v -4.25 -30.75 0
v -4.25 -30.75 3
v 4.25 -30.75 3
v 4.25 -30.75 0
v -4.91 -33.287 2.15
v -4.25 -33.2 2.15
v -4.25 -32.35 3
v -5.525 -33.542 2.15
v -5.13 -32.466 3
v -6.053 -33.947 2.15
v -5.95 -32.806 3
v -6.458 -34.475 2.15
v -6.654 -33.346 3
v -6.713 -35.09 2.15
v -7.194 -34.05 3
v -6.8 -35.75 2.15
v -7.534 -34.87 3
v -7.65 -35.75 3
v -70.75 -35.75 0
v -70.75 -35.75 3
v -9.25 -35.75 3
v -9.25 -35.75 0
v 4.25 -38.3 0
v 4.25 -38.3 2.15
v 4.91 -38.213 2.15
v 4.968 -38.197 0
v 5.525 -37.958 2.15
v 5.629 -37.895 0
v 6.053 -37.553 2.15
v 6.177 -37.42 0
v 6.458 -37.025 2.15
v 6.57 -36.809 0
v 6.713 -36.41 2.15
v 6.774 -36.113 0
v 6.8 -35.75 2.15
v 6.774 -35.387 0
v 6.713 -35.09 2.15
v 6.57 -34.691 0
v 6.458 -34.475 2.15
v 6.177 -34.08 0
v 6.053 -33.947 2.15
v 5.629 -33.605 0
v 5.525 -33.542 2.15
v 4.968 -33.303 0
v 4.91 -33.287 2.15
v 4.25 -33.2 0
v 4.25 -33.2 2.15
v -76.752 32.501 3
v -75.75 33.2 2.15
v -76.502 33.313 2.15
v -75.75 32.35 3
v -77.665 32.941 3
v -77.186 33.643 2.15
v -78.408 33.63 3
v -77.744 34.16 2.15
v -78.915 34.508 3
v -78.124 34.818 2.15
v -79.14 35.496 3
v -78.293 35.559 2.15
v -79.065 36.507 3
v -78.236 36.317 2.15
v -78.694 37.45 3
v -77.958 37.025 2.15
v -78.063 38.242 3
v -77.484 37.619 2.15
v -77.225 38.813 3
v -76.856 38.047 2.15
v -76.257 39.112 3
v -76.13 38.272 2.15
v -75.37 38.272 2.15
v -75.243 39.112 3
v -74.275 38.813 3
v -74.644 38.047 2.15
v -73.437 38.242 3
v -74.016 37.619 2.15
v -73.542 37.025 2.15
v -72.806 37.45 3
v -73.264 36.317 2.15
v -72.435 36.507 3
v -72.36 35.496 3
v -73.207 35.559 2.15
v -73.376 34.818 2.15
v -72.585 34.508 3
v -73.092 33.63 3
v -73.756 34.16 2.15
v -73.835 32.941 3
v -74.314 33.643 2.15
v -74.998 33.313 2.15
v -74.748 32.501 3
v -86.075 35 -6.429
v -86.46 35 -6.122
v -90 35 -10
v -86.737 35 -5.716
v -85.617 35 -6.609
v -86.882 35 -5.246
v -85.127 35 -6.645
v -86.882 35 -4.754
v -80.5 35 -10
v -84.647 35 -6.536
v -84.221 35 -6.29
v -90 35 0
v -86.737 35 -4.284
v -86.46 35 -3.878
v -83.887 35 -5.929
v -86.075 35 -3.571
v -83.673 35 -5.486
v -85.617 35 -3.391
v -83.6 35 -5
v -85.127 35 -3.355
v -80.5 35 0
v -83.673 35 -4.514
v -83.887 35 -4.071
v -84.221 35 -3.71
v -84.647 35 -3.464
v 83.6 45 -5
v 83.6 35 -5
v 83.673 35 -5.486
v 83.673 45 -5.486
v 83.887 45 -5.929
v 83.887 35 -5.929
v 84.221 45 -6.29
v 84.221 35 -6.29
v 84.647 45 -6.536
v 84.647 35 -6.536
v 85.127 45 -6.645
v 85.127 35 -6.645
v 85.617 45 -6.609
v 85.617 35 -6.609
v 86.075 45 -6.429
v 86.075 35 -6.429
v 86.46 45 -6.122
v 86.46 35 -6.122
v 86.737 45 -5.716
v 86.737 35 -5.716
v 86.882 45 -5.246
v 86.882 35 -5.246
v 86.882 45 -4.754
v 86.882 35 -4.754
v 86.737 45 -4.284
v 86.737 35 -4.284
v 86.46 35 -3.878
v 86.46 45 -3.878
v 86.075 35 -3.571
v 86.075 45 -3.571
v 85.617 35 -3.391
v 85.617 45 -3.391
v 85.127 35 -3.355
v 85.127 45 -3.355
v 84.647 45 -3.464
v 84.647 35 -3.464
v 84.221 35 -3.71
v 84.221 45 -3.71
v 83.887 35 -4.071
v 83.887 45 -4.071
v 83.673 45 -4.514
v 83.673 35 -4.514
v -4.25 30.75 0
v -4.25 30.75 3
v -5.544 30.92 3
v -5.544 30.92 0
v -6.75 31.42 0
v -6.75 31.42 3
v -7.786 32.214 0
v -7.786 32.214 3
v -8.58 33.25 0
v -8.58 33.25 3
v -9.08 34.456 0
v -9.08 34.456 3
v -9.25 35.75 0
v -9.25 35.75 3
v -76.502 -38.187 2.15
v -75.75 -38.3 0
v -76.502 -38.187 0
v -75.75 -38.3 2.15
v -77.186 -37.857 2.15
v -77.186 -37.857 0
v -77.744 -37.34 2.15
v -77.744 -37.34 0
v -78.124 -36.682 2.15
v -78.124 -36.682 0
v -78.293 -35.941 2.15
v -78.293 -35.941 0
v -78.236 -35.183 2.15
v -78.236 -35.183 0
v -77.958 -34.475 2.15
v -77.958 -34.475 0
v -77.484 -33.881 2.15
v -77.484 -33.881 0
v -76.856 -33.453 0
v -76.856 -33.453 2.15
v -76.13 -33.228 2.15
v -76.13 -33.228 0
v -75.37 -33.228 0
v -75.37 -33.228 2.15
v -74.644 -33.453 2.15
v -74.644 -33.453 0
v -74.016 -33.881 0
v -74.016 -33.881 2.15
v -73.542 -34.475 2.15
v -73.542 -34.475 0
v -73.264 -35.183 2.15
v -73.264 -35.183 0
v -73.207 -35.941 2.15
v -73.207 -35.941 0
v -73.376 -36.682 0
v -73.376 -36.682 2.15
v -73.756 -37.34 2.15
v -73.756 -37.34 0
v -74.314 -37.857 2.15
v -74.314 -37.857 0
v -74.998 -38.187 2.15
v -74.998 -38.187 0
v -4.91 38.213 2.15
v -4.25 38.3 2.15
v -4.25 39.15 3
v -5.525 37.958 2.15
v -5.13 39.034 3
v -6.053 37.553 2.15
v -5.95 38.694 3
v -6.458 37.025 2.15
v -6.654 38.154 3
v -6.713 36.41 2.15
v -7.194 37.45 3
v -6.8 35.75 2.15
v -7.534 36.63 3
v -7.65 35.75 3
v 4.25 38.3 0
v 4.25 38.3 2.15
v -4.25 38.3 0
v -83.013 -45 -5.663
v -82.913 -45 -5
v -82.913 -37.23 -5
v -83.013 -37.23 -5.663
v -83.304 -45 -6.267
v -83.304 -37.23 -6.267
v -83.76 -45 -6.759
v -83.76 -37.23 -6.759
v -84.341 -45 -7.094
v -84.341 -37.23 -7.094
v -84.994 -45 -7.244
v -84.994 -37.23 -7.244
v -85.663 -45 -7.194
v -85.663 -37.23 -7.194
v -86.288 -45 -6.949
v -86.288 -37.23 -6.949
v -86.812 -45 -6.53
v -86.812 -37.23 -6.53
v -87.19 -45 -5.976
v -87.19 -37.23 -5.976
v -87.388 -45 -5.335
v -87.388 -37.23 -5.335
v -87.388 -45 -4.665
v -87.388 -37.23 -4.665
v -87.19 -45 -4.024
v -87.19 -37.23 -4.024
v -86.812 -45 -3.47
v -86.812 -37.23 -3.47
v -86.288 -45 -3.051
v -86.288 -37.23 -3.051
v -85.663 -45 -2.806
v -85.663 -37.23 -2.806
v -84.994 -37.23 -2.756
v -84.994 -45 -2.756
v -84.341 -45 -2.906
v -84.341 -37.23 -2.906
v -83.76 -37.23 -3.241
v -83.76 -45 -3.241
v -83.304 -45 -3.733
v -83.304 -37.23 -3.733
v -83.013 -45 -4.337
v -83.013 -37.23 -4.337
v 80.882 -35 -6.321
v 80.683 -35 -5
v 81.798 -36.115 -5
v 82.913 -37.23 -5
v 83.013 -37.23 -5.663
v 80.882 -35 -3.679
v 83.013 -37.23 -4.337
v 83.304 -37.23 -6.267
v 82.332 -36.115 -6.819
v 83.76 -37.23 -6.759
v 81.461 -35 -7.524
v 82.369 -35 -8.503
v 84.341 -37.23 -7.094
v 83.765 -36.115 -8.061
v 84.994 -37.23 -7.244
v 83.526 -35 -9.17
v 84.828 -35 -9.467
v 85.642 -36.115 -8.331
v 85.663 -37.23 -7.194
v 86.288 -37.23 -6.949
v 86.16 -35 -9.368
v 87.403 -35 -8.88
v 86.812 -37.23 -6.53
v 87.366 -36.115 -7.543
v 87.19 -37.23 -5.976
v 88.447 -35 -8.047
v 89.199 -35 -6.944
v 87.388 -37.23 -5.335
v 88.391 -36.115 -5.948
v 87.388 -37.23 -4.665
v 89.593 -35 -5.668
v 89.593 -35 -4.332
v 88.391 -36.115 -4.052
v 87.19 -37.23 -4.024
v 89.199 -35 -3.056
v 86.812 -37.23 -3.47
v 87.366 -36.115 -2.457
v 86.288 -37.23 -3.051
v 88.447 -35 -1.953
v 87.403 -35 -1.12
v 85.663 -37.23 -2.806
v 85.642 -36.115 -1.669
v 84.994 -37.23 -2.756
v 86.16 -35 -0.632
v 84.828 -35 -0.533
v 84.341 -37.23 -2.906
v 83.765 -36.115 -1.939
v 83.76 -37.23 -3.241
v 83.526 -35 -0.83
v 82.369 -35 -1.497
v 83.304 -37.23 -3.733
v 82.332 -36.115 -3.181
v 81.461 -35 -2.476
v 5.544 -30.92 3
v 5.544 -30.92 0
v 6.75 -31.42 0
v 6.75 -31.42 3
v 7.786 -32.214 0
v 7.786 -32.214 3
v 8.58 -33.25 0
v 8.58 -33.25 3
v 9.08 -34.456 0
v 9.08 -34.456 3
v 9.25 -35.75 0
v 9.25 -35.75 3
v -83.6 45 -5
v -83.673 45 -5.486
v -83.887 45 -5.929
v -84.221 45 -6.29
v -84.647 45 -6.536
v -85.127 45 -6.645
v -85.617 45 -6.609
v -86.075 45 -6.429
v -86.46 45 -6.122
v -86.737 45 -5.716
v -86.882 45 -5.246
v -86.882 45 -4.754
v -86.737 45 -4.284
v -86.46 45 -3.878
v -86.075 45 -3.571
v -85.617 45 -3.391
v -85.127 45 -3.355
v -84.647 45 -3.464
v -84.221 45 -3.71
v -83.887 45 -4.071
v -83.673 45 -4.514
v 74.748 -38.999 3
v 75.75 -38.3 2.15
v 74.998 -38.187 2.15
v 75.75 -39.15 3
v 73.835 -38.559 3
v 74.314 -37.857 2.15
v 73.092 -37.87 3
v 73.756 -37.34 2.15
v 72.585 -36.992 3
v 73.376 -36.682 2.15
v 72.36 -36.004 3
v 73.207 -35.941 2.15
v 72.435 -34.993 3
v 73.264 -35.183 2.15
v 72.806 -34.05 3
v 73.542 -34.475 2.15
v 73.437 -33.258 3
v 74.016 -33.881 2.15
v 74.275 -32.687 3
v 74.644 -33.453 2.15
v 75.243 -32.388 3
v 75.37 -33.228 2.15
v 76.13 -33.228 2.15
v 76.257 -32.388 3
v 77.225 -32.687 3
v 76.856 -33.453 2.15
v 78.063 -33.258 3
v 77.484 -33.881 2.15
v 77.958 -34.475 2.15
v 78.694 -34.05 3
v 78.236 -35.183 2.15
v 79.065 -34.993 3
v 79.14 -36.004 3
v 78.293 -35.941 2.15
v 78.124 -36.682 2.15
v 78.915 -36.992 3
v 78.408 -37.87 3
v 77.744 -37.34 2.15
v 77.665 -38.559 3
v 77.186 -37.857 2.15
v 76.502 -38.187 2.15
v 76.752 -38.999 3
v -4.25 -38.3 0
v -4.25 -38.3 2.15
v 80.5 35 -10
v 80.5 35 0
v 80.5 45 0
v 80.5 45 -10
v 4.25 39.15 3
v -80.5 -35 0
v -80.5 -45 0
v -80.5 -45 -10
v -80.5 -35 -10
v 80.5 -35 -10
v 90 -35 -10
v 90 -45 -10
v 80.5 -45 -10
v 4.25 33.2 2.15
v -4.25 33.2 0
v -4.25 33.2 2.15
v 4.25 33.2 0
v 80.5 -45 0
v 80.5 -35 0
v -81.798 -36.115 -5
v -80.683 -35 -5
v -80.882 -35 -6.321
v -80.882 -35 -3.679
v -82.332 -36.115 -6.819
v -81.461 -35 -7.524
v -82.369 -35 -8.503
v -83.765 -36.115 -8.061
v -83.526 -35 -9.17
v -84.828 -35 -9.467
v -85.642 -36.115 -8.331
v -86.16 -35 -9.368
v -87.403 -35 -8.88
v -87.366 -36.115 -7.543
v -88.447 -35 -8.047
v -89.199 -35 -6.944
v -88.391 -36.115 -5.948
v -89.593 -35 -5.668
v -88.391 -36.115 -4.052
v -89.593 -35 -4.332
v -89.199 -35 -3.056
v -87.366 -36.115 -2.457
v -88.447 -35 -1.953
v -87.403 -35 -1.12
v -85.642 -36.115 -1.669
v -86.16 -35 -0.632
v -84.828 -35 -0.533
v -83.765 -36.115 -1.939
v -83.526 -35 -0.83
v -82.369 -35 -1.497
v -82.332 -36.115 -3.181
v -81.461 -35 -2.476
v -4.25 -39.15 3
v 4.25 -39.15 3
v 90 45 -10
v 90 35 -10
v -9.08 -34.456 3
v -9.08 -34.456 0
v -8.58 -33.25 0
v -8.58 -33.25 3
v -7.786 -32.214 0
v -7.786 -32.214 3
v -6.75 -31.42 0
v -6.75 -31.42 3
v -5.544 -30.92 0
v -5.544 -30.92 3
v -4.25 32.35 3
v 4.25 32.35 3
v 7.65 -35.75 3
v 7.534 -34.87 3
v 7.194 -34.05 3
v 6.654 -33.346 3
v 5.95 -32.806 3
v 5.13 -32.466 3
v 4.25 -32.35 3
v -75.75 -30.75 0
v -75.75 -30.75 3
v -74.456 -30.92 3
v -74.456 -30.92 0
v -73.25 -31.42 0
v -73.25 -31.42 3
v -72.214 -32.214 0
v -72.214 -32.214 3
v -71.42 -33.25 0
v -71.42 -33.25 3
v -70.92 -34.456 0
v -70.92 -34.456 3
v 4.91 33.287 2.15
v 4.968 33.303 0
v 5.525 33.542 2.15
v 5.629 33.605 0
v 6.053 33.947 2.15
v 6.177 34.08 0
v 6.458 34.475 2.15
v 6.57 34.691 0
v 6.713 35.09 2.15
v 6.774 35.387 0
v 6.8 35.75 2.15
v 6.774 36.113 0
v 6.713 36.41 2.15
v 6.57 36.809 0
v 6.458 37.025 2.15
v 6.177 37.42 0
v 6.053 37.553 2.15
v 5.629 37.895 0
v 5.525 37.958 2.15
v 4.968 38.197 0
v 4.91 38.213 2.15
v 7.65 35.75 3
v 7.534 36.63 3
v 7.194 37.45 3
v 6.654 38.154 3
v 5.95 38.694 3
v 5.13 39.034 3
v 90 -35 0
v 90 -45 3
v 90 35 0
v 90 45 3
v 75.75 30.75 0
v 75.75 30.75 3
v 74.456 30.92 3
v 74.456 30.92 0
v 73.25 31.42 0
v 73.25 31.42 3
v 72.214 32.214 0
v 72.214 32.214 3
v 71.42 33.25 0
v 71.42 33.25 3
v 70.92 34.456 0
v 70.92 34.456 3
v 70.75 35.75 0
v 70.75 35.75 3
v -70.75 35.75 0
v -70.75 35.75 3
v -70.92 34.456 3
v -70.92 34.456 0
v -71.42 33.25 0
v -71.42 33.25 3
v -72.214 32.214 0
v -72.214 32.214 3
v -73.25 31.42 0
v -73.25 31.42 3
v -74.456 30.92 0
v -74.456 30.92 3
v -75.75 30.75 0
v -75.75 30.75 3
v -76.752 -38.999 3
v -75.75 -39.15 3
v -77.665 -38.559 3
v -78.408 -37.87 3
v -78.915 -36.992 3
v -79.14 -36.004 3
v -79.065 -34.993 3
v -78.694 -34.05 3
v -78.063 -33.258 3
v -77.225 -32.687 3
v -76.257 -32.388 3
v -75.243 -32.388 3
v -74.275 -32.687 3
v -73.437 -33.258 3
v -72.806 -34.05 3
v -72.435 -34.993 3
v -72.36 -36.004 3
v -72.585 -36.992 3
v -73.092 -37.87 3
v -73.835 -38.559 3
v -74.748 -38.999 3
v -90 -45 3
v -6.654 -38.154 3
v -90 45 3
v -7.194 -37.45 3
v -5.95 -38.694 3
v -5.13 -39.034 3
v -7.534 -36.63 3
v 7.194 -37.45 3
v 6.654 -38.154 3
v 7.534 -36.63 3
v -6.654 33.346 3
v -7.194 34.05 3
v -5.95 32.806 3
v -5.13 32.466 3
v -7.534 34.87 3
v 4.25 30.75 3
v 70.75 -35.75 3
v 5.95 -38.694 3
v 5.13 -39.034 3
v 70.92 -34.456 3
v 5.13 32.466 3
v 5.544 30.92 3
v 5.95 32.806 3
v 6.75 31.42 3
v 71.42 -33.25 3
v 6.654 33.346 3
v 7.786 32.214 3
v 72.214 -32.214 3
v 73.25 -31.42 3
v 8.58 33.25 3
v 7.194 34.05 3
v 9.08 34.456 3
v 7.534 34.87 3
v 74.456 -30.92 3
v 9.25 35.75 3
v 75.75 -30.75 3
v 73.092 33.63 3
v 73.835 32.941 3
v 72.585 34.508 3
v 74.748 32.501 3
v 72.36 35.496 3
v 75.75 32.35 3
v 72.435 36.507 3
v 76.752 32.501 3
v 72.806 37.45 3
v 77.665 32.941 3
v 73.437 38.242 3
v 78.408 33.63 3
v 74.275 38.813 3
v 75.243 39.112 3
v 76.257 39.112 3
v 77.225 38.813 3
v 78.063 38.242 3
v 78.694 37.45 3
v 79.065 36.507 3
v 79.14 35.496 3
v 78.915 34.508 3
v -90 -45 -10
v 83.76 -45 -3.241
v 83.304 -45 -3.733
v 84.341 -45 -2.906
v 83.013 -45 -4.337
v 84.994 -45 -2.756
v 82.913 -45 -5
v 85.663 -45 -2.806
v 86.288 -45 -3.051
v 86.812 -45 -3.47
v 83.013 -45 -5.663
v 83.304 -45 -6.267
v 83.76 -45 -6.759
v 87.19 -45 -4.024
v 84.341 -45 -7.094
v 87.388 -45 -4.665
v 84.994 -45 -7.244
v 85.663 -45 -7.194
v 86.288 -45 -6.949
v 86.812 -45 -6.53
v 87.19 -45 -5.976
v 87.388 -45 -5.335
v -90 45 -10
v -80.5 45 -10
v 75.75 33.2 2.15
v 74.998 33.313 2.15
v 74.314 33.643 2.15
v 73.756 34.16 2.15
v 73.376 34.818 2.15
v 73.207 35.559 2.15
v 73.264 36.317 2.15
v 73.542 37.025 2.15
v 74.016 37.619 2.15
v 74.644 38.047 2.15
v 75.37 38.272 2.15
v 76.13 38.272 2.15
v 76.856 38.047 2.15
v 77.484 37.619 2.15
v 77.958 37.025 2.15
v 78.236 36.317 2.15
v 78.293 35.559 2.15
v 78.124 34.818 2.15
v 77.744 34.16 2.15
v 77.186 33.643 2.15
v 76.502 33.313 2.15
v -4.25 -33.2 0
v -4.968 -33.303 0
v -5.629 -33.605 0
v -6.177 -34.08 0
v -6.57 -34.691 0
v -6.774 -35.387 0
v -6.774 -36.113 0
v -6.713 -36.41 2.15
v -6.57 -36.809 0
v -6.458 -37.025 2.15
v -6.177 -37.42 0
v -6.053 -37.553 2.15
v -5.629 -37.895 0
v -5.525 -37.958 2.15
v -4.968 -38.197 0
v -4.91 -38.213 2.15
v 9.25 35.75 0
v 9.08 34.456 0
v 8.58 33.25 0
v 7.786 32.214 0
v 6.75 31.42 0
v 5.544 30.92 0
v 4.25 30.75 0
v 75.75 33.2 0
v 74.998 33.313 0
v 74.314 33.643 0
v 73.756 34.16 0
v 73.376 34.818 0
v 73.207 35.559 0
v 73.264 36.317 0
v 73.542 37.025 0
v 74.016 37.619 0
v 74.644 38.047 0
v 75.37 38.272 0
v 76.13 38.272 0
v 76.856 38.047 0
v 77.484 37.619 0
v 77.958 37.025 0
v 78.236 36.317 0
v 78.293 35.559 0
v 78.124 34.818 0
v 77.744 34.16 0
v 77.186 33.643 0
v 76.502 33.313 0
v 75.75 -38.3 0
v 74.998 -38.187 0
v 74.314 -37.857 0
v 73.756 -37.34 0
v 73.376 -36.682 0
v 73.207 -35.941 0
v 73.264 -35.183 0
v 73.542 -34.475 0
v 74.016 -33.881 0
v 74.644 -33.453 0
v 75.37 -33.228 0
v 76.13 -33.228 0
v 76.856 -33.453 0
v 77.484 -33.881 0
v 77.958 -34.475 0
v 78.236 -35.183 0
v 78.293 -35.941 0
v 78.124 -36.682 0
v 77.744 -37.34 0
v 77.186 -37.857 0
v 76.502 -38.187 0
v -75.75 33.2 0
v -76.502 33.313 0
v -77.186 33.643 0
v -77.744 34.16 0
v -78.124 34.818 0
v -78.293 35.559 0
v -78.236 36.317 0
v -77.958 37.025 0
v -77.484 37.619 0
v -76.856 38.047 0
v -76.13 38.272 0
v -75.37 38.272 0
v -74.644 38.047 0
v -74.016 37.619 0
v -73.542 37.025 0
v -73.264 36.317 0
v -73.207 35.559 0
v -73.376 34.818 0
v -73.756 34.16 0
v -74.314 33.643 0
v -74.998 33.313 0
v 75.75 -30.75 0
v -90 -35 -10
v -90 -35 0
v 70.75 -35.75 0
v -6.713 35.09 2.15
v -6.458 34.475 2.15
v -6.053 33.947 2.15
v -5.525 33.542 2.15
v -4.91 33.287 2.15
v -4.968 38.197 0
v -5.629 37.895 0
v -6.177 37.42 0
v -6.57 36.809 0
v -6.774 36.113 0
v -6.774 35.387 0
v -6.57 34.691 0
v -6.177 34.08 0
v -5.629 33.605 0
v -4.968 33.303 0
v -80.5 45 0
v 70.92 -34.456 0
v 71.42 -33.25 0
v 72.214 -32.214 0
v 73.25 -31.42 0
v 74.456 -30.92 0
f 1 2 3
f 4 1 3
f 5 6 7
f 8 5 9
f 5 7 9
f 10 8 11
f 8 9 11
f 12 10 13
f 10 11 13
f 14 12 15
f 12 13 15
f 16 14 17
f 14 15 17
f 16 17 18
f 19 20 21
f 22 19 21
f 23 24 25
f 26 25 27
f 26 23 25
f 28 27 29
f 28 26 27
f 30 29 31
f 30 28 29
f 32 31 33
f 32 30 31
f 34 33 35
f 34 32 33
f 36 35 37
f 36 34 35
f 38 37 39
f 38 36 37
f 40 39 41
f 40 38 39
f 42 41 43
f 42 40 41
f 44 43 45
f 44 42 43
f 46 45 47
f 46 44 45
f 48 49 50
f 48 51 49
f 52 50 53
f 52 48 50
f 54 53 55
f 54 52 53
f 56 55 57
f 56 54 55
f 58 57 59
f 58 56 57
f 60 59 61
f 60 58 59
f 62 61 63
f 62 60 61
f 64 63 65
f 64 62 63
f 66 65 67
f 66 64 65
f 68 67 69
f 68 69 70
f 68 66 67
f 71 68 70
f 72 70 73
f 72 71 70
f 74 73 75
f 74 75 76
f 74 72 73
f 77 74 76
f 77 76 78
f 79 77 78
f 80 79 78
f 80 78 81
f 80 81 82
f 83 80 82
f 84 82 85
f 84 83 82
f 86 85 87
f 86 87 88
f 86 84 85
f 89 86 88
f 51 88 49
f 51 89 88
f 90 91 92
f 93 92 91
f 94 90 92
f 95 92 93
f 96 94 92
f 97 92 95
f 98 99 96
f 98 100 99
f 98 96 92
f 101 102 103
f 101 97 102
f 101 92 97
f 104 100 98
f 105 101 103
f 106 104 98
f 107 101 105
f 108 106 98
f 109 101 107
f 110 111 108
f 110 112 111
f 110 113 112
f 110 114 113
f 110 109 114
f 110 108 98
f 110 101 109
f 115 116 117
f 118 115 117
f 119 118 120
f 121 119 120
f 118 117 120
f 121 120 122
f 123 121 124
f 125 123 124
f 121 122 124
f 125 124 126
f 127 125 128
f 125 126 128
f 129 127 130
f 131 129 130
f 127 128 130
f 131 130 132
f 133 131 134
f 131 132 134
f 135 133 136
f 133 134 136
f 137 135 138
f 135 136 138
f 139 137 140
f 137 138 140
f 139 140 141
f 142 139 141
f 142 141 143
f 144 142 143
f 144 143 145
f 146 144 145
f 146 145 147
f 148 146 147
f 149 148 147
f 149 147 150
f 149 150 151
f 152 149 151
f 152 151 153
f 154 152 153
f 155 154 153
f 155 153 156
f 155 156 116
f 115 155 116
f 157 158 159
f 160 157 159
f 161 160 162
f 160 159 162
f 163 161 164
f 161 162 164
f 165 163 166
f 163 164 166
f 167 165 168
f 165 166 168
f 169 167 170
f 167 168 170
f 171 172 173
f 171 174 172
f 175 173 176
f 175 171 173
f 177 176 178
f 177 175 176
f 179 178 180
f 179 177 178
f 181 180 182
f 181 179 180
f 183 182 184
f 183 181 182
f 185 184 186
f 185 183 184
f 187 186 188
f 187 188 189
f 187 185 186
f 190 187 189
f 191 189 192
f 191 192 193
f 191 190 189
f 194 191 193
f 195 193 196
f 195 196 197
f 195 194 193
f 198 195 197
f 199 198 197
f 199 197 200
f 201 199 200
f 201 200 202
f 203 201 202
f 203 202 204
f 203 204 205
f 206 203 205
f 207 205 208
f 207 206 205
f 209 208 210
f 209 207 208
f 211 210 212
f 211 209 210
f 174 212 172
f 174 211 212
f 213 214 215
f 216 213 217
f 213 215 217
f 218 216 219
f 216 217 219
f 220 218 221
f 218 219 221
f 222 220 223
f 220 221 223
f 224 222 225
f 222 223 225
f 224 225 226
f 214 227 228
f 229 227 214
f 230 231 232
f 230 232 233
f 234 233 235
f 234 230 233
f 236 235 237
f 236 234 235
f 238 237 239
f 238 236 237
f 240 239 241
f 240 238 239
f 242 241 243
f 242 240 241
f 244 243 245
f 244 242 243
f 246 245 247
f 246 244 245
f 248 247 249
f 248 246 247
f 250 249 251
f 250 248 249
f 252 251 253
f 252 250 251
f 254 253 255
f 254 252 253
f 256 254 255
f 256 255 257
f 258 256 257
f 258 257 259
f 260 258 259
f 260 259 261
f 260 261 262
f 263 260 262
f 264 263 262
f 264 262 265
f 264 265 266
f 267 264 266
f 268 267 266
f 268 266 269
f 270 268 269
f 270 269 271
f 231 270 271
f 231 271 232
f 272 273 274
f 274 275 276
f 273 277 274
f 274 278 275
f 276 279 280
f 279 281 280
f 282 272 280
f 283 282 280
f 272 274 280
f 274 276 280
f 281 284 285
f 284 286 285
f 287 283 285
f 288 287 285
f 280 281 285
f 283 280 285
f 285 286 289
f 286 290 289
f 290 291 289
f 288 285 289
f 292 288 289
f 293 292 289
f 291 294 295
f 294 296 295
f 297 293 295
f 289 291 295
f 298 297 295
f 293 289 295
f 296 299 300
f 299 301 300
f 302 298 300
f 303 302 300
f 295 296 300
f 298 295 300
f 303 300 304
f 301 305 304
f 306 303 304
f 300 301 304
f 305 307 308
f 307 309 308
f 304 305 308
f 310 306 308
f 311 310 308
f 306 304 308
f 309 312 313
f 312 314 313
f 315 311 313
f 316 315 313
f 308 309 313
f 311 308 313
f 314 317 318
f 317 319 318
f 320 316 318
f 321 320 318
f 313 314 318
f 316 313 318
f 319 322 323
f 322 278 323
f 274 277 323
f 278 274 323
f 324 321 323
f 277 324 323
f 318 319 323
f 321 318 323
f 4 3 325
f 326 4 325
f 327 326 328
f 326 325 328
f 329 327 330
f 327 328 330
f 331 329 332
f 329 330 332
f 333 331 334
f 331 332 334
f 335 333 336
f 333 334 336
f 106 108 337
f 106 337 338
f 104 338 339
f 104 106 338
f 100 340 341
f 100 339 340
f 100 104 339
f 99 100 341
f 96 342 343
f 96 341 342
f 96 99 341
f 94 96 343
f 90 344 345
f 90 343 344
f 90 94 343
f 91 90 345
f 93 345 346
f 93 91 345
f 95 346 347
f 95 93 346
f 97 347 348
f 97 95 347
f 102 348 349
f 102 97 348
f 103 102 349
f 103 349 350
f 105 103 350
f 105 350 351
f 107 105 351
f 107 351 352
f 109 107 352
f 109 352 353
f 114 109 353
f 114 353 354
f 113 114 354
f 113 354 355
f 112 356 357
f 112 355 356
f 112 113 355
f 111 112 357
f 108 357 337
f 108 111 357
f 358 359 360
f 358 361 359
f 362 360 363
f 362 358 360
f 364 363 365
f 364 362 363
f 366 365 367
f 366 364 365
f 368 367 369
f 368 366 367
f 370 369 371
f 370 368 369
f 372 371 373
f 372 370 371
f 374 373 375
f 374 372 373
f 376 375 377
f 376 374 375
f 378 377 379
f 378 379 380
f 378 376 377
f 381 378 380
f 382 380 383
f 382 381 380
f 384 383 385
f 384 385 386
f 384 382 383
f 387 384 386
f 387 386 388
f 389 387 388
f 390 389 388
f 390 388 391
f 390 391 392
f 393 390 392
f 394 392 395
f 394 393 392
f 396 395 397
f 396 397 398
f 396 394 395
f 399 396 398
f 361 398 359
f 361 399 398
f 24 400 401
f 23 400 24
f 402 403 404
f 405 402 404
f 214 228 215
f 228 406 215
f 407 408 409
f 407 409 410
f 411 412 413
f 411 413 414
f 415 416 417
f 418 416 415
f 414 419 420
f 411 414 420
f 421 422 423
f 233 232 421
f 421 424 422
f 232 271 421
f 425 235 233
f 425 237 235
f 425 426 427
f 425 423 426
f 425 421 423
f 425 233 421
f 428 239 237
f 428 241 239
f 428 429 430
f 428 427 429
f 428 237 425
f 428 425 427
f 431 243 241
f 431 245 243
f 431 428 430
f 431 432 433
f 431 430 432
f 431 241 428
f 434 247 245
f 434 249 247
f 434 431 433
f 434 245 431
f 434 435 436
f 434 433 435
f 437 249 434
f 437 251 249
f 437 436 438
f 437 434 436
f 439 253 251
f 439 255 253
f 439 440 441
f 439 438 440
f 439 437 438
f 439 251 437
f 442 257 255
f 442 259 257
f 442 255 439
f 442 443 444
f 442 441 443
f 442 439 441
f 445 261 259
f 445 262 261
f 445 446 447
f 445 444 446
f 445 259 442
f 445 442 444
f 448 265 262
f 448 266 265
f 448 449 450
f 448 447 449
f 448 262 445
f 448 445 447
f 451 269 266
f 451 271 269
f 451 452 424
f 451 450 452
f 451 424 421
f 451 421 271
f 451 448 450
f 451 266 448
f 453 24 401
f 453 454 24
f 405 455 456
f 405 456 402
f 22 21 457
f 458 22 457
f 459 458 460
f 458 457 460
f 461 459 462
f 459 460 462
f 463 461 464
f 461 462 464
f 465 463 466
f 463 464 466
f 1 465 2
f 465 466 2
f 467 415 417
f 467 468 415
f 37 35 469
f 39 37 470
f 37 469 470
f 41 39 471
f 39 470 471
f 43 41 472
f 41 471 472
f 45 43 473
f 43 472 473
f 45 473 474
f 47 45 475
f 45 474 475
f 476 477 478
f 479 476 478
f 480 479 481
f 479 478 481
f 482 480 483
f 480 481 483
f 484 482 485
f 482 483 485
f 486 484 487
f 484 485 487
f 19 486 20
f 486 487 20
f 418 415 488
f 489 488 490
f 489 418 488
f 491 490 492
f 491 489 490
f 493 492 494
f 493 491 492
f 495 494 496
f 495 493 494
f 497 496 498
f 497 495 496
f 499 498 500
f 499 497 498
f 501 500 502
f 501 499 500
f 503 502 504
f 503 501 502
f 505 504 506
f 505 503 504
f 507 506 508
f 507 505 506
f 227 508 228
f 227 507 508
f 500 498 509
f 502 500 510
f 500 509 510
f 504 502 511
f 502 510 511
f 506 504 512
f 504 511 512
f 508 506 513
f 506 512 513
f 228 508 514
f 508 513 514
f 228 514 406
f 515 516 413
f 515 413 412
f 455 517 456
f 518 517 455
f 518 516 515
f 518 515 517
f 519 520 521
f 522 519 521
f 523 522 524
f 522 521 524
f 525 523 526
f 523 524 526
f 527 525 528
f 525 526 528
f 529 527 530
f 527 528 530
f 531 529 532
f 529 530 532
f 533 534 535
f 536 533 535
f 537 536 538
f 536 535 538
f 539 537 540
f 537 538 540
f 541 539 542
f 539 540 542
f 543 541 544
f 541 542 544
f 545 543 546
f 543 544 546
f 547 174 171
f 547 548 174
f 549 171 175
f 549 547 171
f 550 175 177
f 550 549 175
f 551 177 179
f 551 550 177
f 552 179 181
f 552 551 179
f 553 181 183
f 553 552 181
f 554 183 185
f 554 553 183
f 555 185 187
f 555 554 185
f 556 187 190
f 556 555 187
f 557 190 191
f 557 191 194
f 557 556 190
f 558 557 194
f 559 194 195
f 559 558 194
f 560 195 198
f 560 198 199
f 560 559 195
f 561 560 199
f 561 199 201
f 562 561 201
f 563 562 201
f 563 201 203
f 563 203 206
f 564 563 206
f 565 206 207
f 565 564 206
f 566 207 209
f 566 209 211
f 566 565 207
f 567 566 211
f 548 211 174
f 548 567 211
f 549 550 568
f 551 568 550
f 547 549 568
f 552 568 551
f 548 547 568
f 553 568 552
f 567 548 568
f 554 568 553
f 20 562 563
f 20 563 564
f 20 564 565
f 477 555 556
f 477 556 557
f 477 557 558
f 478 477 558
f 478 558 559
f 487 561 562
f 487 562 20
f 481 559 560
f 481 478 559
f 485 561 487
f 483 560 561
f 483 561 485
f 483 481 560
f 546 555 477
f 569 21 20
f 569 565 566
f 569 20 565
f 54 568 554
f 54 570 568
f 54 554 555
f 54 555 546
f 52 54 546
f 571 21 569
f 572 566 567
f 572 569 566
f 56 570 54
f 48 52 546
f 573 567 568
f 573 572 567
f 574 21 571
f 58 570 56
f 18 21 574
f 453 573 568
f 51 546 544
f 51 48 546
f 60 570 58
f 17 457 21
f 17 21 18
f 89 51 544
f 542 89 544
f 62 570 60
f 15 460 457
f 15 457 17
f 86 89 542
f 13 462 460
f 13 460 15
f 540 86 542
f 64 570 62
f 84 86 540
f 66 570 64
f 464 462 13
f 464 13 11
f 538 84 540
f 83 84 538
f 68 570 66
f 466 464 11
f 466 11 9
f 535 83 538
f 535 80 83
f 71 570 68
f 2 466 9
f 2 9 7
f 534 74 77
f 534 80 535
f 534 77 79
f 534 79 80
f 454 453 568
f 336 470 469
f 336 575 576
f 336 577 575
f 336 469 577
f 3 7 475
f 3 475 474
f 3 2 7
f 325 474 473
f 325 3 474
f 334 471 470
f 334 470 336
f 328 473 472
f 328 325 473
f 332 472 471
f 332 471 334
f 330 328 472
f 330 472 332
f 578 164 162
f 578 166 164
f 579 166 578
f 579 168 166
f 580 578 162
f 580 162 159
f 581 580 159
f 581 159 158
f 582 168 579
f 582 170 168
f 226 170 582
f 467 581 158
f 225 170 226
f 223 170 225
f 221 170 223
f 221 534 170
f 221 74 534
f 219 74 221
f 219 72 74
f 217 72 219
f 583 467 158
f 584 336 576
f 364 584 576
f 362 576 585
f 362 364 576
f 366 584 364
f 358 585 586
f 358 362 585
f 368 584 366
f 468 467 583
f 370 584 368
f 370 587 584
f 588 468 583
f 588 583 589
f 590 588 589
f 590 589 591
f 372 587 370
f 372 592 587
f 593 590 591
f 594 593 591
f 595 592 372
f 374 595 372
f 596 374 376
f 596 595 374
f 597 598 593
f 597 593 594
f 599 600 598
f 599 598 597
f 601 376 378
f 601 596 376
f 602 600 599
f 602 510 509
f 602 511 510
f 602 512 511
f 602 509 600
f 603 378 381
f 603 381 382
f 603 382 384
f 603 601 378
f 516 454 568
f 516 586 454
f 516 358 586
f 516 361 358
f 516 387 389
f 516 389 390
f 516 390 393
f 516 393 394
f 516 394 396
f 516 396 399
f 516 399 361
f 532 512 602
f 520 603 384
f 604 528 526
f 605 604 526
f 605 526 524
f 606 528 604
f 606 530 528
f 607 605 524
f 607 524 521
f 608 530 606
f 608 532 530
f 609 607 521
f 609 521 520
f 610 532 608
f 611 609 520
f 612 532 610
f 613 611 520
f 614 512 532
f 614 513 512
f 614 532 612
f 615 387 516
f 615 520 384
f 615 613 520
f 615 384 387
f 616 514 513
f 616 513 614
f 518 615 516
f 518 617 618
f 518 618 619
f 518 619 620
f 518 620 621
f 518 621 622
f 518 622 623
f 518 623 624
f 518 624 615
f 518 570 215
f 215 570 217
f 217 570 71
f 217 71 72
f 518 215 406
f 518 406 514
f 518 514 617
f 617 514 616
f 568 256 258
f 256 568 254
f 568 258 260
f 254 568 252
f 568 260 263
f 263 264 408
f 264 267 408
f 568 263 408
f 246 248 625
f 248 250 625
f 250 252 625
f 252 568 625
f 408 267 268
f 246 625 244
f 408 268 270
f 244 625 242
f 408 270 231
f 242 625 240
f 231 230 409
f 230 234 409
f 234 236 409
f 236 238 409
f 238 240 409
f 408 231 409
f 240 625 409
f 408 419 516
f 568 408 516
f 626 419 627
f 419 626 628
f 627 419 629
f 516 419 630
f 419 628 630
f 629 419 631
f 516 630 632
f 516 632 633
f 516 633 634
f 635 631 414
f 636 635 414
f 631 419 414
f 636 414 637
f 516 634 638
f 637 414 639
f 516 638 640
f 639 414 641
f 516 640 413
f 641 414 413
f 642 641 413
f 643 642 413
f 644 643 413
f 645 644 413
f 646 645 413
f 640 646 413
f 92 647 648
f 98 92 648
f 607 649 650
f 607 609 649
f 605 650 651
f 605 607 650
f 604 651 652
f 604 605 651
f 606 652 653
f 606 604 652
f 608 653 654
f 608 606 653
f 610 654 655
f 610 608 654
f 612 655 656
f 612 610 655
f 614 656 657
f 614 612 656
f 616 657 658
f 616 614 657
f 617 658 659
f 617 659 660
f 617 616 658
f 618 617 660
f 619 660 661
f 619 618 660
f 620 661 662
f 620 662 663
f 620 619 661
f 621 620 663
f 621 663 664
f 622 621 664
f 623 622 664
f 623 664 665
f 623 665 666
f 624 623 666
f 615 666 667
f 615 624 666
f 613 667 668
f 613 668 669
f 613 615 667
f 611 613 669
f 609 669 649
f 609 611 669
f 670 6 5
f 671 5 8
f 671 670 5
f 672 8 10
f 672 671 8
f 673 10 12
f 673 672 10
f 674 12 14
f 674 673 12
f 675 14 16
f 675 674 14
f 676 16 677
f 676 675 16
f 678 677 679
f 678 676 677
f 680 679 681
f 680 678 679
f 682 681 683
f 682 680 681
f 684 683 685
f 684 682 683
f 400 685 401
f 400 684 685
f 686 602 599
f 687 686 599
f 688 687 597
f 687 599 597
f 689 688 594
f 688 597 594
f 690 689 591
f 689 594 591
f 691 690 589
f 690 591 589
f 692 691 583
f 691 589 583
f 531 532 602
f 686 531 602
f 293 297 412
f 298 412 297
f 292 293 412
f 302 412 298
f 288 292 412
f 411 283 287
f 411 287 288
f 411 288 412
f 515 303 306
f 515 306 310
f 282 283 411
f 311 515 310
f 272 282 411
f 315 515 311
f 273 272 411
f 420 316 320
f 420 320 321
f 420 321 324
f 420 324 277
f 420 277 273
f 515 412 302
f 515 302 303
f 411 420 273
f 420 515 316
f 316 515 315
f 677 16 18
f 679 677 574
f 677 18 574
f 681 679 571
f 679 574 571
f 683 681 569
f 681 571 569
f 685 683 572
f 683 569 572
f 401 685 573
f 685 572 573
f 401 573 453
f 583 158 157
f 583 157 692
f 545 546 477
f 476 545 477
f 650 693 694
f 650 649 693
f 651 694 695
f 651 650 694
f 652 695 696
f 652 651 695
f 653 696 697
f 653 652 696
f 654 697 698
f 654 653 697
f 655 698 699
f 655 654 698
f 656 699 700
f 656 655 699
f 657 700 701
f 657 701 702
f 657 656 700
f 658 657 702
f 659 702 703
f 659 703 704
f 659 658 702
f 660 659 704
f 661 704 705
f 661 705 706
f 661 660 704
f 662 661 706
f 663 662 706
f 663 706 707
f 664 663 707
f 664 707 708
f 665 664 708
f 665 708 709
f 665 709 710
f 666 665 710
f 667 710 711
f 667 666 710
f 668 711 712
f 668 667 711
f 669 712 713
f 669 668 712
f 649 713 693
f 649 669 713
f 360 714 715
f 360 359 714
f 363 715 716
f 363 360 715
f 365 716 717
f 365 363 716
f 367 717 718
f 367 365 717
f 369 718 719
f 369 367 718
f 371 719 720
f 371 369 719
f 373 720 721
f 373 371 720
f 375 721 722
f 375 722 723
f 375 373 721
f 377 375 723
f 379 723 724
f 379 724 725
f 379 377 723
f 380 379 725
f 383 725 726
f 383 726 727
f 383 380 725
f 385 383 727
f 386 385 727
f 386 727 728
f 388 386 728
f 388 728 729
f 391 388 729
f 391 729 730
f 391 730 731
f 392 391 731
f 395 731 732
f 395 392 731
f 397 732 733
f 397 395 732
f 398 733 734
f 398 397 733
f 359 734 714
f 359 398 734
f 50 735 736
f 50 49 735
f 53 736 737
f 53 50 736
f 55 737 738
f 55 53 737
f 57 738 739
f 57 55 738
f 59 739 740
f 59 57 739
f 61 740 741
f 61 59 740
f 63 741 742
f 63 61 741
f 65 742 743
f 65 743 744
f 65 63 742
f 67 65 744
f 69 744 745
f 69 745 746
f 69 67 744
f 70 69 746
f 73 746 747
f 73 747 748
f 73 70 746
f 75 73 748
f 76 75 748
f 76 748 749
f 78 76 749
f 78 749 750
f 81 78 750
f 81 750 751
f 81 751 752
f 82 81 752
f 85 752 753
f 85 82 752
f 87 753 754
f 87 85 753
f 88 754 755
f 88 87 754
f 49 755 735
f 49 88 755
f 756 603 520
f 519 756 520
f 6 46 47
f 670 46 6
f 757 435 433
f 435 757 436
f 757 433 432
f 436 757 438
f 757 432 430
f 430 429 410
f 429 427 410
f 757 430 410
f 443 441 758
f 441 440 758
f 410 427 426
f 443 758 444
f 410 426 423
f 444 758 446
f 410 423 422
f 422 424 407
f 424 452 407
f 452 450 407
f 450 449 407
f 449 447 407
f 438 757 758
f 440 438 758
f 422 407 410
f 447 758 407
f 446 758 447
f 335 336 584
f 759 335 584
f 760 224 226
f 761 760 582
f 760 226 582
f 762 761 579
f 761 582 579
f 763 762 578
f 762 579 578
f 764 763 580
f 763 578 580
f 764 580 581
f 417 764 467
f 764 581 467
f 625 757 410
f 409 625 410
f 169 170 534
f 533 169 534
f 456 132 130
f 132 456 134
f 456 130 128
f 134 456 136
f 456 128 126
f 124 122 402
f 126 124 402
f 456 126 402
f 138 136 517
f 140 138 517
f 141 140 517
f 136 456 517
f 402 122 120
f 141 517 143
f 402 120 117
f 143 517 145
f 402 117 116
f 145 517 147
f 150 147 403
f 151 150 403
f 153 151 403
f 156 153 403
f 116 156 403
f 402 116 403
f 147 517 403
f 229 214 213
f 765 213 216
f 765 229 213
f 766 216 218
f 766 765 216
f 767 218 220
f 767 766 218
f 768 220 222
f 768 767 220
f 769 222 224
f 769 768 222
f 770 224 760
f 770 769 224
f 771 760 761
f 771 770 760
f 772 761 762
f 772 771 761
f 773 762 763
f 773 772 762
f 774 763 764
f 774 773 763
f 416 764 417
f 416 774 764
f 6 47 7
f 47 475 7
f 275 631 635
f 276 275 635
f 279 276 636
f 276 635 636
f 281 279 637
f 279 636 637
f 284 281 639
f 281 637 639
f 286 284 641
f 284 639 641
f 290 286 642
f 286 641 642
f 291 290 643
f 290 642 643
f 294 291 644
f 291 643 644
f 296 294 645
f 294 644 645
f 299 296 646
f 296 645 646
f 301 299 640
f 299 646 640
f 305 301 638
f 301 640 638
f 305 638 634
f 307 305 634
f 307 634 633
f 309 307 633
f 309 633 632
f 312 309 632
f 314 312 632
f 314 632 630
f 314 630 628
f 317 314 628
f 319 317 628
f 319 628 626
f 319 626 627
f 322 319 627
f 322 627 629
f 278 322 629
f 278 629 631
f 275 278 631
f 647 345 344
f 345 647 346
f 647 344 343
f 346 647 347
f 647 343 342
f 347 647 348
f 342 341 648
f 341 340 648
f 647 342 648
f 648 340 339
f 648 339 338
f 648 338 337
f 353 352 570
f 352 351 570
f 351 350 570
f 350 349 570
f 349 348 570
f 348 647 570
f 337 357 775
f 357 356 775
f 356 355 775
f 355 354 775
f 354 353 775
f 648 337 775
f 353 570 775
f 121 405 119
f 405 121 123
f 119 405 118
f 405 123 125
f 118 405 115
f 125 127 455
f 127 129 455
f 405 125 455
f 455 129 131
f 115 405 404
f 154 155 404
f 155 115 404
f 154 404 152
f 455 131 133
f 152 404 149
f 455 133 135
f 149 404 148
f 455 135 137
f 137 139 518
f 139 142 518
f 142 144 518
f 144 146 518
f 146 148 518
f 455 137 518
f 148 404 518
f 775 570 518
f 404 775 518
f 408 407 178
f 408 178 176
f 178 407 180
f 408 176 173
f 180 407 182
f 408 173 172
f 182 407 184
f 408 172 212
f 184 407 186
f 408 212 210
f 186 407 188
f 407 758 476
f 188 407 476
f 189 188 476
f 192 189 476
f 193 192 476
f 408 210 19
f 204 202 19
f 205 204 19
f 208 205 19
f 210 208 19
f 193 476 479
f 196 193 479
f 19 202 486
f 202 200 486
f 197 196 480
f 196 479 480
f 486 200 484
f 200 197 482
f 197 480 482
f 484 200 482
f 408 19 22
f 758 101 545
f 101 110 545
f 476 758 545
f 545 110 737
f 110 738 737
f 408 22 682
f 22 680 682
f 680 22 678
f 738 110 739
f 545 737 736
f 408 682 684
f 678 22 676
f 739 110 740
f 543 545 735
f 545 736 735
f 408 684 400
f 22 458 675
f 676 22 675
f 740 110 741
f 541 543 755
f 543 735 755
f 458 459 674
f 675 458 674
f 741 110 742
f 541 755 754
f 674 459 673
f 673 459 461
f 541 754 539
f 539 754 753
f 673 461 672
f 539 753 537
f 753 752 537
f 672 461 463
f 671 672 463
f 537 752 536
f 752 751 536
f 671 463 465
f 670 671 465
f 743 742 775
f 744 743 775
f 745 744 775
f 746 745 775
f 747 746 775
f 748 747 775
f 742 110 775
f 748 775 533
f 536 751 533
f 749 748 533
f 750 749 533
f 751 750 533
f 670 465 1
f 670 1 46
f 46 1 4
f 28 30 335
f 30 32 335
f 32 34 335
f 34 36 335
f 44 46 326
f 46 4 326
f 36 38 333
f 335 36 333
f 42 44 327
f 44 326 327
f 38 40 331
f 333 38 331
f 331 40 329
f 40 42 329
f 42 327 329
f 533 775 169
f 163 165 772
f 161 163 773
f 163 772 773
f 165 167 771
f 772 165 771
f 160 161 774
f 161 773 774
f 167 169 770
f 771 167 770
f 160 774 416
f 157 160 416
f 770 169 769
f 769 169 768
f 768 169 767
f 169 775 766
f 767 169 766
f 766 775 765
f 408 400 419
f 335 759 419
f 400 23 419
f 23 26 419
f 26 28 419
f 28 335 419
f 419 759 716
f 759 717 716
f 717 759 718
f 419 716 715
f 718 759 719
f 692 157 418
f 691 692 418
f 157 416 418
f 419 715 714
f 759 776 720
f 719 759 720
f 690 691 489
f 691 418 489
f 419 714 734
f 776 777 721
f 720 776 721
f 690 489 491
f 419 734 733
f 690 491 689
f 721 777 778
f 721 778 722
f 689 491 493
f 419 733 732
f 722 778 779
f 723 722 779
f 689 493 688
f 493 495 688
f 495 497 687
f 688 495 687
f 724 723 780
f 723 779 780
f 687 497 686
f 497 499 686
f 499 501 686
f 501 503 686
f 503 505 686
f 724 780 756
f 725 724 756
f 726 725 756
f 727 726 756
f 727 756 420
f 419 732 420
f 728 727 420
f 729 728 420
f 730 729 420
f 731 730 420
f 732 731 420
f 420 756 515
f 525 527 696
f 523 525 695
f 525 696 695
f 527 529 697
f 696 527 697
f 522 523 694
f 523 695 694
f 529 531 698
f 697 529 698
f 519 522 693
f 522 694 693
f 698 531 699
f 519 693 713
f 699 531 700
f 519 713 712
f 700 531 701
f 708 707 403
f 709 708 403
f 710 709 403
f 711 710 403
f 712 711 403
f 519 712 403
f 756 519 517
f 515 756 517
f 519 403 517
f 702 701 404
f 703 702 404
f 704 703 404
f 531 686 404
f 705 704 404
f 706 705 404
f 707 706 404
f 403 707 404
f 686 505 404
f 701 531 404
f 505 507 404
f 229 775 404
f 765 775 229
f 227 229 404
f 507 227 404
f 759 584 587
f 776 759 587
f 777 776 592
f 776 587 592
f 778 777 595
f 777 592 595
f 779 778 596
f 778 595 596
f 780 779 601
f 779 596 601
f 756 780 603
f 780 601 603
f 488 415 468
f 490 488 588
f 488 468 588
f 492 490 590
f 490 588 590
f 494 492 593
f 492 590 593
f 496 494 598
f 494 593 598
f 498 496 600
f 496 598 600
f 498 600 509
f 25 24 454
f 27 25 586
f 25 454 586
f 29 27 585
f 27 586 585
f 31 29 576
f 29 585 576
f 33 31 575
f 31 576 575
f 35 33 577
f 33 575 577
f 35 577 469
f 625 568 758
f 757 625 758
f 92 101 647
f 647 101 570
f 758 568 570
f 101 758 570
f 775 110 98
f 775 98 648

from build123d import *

# Parameters (mm, degrees)
SKETCH3_W                                      = 180
SKETCH3_H                                      = 90
BOSS_EXTRUDE3_DEPTH                            = 3
SKETCH4_W                                      = 8.5
SKETCH4_H                                      = 61.5
CUT_EXTRUDE1_DEPTH                             = 3
CSK_FOR_M5_FLAT_HEAD_MACHINE_SCREW1_AT_2_COUNT = 2
CSK_FOR_M5_FLAT_HEAD_MACHINE_SCREW1_AT_2_PITCH = 167.524625056
CSK_FOR_M5_FLAT_HEAD_MACHINE_SCREW1_AT_3_COUNT = 2
CSK_FOR_M5_FLAT_HEAD_MACHINE_SCREW1_AT_3_PITCH = 71.5
CSK_FOR_M5_FLAT_HEAD_MACHINE_SCREW1_AT_4_COUNT = 2
CSK_FOR_M5_FLAT_HEAD_MACHINE_SCREW1_AT_4_PITCH = 151.5
CSK_SLOT_FOR_M5_FLAT_HEAD_MACHINE_SCREW1_DEPTH = 3
SKETCH12_W                                     = 9.5
SKETCH12_H                                     = 10
BOSS_EXTRUDE4_DEPTH                            = 10
CSK_FOR_M4_SFHCS1_D                            = 4.5
CSK_FOR_M4_SFHCS1_DEPTH                        = 10
CSK_FOR_M4_SFHCS1_CSINK_D                      = 8.96
CSK_FOR_M4_SFHCS1_CSINK_ANGLE                  = 90
M4X0_7_TAPPED_HOLE1_D                          = 3.3


with BuildPart() as part:
    # Sketch3 → Boss-Extrude3 (new body)
    with BuildSketch(Plane.XY):
        Rectangle(SKETCH3_W, SKETCH3_H)
    extrude(amount=BOSS_EXTRUDE3_DEPTH)

    # Sketch4 → Cut-Extrude1 (cut)
    with BuildSketch(Plane.XY.offset(3)):
        with BuildLine():
            Line((-4.25, -30.75), (-4.25, 30.75))
            ThreePointArc((-4.25, 30.75), (-7.785533906, 32.214466094), (-9.25, 35.75))
            Line((-9.25, 35.75), (-70.75, 35.75))
            ThreePointArc((-70.75, 35.75), (-72.214466094, 32.214466094), (-75.75, 30.75))
            Line((-75.75, 30.75), (-75.75, -30.75))
            ThreePointArc((-75.75, -30.75), (-72.214466094, -32.214466094), (-70.75, -35.75))
            Line((-70.75, -35.75), (-9.25, -35.75))
            ThreePointArc((-9.25, -35.75), (-7.785533906, -32.214466094), (-4.25, -30.75))
        make_face()
        Rectangle(SKETCH4_W, SKETCH4_H)
        with BuildLine():
            ThreePointArc((9.25, 35.75), (7.785533906, 32.214466094), (4.25, 30.75))
            Line((4.25, 30.75), (4.25, -30.75))
            ThreePointArc((4.25, -30.75), (7.785533906, -32.214466094), (9.25, -35.75))
            Line((9.25, -35.75), (70.75, -35.75))
            ThreePointArc((70.75, -35.75), (72.214466094, -32.214466094), (75.75, -30.75))
            Line((75.75, -30.75), (75.75, 30.75))
            ThreePointArc((75.75, 30.75), (72.214466094, 32.214466094), (70.75, 35.75))
            Line((70.75, 35.75), (9.25, 35.75))
        make_face()
    extrude(amount=-CUT_EXTRUDE1_DEPTH, mode=Mode.SUBTRACT)

    # Sketch8 → CSK for M5 Flat Head Machine Screw1 (revolve, cut)
    with BuildSketch(Plane(origin=(-75.75, 35.75, 3), x_dir=(0, -1, 0), z_dir=(1, 0, 0))):
        Polygon((0, 0), (0, 3), (2.55, 3), (2.55, 0.85), (3.4, 0), align=None)
    csk_for_m5_flat_head_machine_screw1 = revolve(axis=Axis((-75.75, 35.75, 9.35), (0, 0, -1)), mode=Mode.SUBTRACT)

    # CSK for M5 Flat Head Machine Screw1 at 2: CSK for M5 Flat Head Machine Screw1 ×2
    with Locations(*[Vector(0.9043446594777974, -0.4268029251000826, 0) * (i * CSK_FOR_M5_FLAT_HEAD_MACHINE_SCREW1_AT_2_PITCH) for i in range(1, CSK_FOR_M5_FLAT_HEAD_MACHINE_SCREW1_AT_2_COUNT)]):
        add(csk_for_m5_flat_head_machine_screw1, mode=Mode.SUBTRACT)

    # CSK for M5 Flat Head Machine Screw1 at 3: CSK for M5 Flat Head Machine Screw1 ×2
    with Locations(*[(0, -i * CSK_FOR_M5_FLAT_HEAD_MACHINE_SCREW1_AT_3_PITCH, 0) for i in range(1, CSK_FOR_M5_FLAT_HEAD_MACHINE_SCREW1_AT_3_COUNT)]):
        add(csk_for_m5_flat_head_machine_screw1, mode=Mode.SUBTRACT)

    # CSK for M5 Flat Head Machine Screw1 at 4: CSK for M5 Flat Head Machine Screw1 ×2
    with Locations(*[(i * CSK_FOR_M5_FLAT_HEAD_MACHINE_SCREW1_AT_4_PITCH, 0, 0) for i in range(1, CSK_FOR_M5_FLAT_HEAD_MACHINE_SCREW1_AT_4_COUNT)]):
        add(csk_for_m5_flat_head_machine_screw1, mode=Mode.SUBTRACT)

    # CSK SLOT for M5 Flat Head Machine Screw1: read off the stored shape, not the designer's step
    # CSK SLOT for M5 Flat Head Machine Sc 2 → CSK SLOT for M5 Flat Head Machine Screw1 (cut)
    with BuildSketch(Plane.XY):
        with BuildLine():
            Line((-4.25, 33.2), (4.25, 33.2))
            ThreePointArc((4.25, 33.2), (6.8, 35.75), (4.25, 38.3))
            Line((4.25, 38.3), (-4.25, 38.3))
            ThreePointArc((-4.25, 38.3), (-6.8, 35.75), (-4.25, 33.2))
        make_face()
        with BuildLine():
            Line((-4.25, -38.3), (4.25, -38.3))
            ThreePointArc((4.25, -38.3), (6.8, -35.75), (4.25, -33.2))
            Line((4.25, -33.2), (-4.25, -33.2))
            ThreePointArc((-4.25, -33.2), (-6.8, -35.75), (-4.25, -38.3))
        make_face()
    extrude(amount=CSK_SLOT_FOR_M5_FLAT_HEAD_MACHINE_SCREW1_DEPTH, mode=Mode.SUBTRACT)

    # CSK SLOT for M5 Flat Head Machine Sc 3: loft between two sections, ruled curve by curve
    csk_slot_for_m5_flat_head_machine_sc_3_from = [
        Edge.make_three_point_arc((4.25, 33.2, 2.15), (6.053122292, 33.946877708, 2.15), (6.8, 35.75, 2.15)),
        Edge.make_three_point_arc((6.8, 35.75, 2.15), (6.053122292, 37.553122292, 2.15), (4.25, 38.3, 2.15)),
        Edge.make_three_point_arc((-4.25, 38.3, 2.15), (-6.053122292, 37.553122292, 2.15), (-6.8, 35.75, 2.15)),
        Edge.make_three_point_arc((-6.8, 35.75, 2.15), (-6.053122292, 33.946877708, 2.15), (-4.25, 33.2, 2.15)),
        Edge.make_line((4.25, 38.3, 2.15), (-4.25, 38.3, 2.15)),
        Edge.make_line((4.25, 33.2, 2.15), (-4.25, 33.2, 2.15)),
    ]
    csk_slot_for_m5_flat_head_machine_sc_3_to = [
        Edge.make_three_point_arc((4.25, 32.35, 3), (6.654163056, 33.345836944, 3), (7.65, 35.75, 3)),
        Edge.make_three_point_arc((7.65, 35.75, 3), (6.654163056, 38.154163056, 3), (4.25, 39.15, 3)),
        Edge.make_three_point_arc((-4.25, 39.15, 3), (-6.654163056, 38.154163056, 3), (-7.65, 35.75, 3)),
        Edge.make_three_point_arc((-7.65, 35.75, 3), (-6.654163056, 33.345836944, 3), (-4.25, 32.35, 3)),
        Edge.make_line((4.25, 39.15, 3), (-4.25, 39.15, 3)),
        Edge.make_line((4.25, 32.35, 3), (-4.25, 32.35, 3)),
    ]
    csk_slot_for_m5_flat_head_machine_sc_3 = Solid(Shell([*[Face.make_surface_from_curves(csk_slot_for_m5_flat_head_machine_sc_3_from[k], csk_slot_for_m5_flat_head_machine_sc_3_to[k]) for k in range(6)], Face(Wire(csk_slot_for_m5_flat_head_machine_sc_3_from)), Face(Wire(csk_slot_for_m5_flat_head_machine_sc_3_to))]))
    add(csk_slot_for_m5_flat_head_machine_sc_3, mode=Mode.SUBTRACT)

    # CSK SLOT for M5 Flat Head Machine Sc 4: loft between two sections, ruled curve by curve
    csk_slot_for_m5_flat_head_machine_sc_4_from = [
        Edge.make_three_point_arc((4.25, -38.3, 2.15), (6.053122292, -37.553122292, 2.15), (6.8, -35.75, 2.15)),
        Edge.make_three_point_arc((6.8, -35.75, 2.15), (6.053122292, -33.946877708, 2.15), (4.25, -33.2, 2.15)),
        Edge.make_three_point_arc((-4.25, -33.2, 2.15), (-6.053122292, -33.946877708, 2.15), (-6.8, -35.75, 2.15)),
        Edge.make_three_point_arc((-6.8, -35.75, 2.15), (-6.053122292, -37.553122292, 2.15), (-4.25, -38.3, 2.15)),
        Edge.make_line((4.25, -33.2, 2.15), (-4.25, -33.2, 2.15)),
        Edge.make_line((4.25, -38.3, 2.15), (-4.25, -38.3, 2.15)),
    ]
    csk_slot_for_m5_flat_head_machine_sc_4_to = [
        Edge.make_three_point_arc((4.25, -39.15, 3), (6.654163056, -38.154163056, 3), (7.65, -35.75, 3)),
        Edge.make_three_point_arc((7.65, -35.75, 3), (6.654163056, -33.345836944, 3), (4.25, -32.35, 3)),
        Edge.make_three_point_arc((-4.25, -32.35, 3), (-6.654163056, -33.345836944, 3), (-7.65, -35.75, 3)),
        Edge.make_three_point_arc((-7.65, -35.75, 3), (-6.654163056, -38.154163056, 3), (-4.25, -39.15, 3)),
        Edge.make_line((4.25, -32.35, 3), (-4.25, -32.35, 3)),
        Edge.make_line((4.25, -39.15, 3), (-4.25, -39.15, 3)),
    ]
    csk_slot_for_m5_flat_head_machine_sc_4 = Solid(Shell([*[Face.make_surface_from_curves(csk_slot_for_m5_flat_head_machine_sc_4_from[k], csk_slot_for_m5_flat_head_machine_sc_4_to[k]) for k in range(6)], Face(Wire(csk_slot_for_m5_flat_head_machine_sc_4_from)), Face(Wire(csk_slot_for_m5_flat_head_machine_sc_4_to))]))
    add(csk_slot_for_m5_flat_head_machine_sc_4, mode=Mode.SUBTRACT)

    # Sketch12 → Boss-Extrude4 (add)
    with BuildSketch(Plane(origin=(0, 0, 0), x_dir=(-1, 0, 0), z_dir=(0, 0, -1))):
        with Locations((-85.25, 40)):
            Rectangle(SKETCH12_W, SKETCH12_H)
        with Locations((-85.25, -40)):
            Rectangle(SKETCH12_W, SKETCH12_H)
    boss_extrude4 = extrude(amount=BOSS_EXTRUDE4_DEPTH)

    # CSK for M4 SFHCS1
    with Locations(Plane(origin=(0, -35, 0), x_dir=(1, 0, 0), z_dir=(0, 1, 0))):
        with Locations((85.162636167, 5)):
            csk_for_m4_sfhcs1 = CounterSinkHole(CSK_FOR_M4_SFHCS1_D / 2, CSK_FOR_M4_SFHCS1_CSINK_D / 2, depth=CSK_FOR_M4_SFHCS1_DEPTH, counter_sink_angle=CSK_FOR_M4_SFHCS1_CSINK_ANGLE)

    # M4x0.7 Tapped Hole1 (through all)
    with Locations(Plane(origin=(0, 45, 0), x_dir=(1, 0, 0), z_dir=(0, 1, 0))):
        with Locations((85.25, 5)):
            m4x0_7_tapped_hole1 = Hole(M4X0_7_TAPPED_HOLE1_D / 2)

    # Mirror1: Boss-Extrude4, CSK for M4 SFHCS1, M4x0.7 Tapped Hole1 across plane
    add(boss_extrude4.mirror(Plane(origin=(0, 0, 0), x_dir=(0, 0, 1), z_dir=(1, 0, 0))))
    add(csk_for_m4_sfhcs1.mirror(Plane(origin=(0, 0, 0), x_dir=(0, 0, 1), z_dir=(1, 0, 0))), mode=Mode.SUBTRACT)
    add(m4x0_7_tapped_hole1.mirror(Plane(origin=(0, 0, 0), x_dir=(0, 0, 1), z_dir=(1, 0, 0))), mode=Mode.SUBTRACT)


solid = part.part
